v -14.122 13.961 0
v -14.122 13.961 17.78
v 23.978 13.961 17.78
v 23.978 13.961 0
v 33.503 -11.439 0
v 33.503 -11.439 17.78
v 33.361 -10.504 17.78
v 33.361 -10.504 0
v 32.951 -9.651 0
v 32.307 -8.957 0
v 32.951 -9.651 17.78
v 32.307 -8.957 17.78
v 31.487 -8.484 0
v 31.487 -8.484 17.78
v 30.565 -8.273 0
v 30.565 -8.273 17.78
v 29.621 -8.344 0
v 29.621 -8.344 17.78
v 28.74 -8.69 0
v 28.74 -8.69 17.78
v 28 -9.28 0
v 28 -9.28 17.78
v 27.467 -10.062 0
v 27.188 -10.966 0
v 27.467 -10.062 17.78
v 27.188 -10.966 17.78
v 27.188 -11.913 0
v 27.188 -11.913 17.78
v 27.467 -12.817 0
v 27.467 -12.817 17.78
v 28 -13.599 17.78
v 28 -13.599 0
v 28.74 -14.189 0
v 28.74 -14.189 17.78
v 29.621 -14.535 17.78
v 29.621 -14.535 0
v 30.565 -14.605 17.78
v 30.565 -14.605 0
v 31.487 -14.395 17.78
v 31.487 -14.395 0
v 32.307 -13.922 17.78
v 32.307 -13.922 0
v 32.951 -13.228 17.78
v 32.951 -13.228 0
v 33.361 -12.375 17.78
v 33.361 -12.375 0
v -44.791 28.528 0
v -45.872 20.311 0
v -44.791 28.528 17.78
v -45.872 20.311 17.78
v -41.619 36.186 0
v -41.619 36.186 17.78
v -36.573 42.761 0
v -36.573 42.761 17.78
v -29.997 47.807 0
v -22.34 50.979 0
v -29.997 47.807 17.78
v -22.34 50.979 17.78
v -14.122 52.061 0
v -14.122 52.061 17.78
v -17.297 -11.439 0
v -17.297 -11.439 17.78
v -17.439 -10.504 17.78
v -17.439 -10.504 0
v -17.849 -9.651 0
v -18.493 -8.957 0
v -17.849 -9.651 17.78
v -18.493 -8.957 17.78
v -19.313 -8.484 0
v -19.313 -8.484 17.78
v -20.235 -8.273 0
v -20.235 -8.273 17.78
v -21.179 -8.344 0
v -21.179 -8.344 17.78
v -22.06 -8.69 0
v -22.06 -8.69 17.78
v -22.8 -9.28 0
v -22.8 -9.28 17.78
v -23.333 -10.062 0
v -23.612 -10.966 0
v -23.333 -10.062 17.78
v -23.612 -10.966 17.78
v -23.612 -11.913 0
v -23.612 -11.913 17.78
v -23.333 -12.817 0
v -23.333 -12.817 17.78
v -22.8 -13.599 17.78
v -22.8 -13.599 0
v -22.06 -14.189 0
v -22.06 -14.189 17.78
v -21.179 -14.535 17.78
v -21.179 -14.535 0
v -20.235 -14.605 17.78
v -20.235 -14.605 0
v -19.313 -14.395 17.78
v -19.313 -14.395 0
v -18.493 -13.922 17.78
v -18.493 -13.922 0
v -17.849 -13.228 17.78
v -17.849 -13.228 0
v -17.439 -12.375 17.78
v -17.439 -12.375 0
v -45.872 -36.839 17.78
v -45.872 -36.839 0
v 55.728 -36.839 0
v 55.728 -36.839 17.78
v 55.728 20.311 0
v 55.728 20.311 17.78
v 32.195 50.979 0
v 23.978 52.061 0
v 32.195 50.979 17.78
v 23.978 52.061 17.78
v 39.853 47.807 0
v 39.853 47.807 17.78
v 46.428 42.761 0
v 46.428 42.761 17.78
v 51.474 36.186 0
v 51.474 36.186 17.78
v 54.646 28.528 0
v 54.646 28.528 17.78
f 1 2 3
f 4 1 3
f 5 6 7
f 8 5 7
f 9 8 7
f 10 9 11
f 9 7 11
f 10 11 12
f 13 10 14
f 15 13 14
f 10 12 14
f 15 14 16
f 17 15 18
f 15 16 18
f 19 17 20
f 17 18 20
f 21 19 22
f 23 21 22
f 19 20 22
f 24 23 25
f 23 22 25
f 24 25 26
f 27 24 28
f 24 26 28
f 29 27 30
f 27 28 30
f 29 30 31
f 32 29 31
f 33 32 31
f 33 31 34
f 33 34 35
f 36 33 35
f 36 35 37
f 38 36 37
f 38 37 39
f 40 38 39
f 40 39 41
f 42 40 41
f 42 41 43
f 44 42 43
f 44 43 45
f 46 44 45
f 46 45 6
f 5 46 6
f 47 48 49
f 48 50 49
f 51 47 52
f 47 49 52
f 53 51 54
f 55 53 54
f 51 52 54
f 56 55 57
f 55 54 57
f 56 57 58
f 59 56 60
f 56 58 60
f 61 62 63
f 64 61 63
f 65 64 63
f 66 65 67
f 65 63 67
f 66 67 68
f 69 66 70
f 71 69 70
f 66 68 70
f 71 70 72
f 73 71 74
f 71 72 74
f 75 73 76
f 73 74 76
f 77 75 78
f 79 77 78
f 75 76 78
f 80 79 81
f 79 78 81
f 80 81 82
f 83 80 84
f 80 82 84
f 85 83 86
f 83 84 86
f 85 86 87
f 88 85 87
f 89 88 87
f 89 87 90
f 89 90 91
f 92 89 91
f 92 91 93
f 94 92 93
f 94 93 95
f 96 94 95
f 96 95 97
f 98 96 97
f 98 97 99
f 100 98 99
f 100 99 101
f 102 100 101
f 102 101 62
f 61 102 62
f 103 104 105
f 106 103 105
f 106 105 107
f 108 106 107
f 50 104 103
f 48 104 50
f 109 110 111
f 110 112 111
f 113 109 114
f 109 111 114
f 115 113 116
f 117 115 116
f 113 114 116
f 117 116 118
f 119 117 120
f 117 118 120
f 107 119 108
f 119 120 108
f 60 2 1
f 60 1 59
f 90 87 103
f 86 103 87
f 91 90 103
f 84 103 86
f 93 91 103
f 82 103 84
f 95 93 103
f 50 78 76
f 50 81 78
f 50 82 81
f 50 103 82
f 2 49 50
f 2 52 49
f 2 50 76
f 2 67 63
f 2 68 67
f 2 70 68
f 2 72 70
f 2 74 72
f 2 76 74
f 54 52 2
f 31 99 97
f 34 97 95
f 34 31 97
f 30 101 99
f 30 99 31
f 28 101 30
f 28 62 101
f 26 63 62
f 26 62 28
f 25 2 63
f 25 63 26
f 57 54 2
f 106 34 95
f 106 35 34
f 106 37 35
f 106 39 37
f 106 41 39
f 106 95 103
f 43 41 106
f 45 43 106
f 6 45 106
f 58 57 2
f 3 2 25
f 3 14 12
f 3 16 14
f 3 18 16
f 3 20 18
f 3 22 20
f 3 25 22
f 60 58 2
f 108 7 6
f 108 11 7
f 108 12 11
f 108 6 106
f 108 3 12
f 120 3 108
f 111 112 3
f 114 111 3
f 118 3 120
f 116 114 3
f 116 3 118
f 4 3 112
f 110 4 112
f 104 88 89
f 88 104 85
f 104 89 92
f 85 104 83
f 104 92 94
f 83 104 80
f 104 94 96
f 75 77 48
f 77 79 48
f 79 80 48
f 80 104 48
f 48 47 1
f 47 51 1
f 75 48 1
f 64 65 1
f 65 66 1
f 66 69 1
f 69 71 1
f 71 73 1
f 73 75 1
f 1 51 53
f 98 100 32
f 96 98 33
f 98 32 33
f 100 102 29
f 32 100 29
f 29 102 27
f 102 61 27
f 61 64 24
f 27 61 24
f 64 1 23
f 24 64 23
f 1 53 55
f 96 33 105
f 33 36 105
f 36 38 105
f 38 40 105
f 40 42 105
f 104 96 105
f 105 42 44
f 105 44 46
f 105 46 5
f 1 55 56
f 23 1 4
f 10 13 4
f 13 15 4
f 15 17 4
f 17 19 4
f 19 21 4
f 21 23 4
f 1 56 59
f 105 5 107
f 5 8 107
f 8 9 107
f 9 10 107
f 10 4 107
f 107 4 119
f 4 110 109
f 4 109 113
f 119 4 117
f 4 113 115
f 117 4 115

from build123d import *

# Parameters (mm, degrees)
SKETCH1_W           = 101.6
SKETCH1_H           = 88.9
BOSS_EXTRUDE1_DEPTH = 17.78
SKETCH2_R           = 3.175
CUT_EXTRUDE1_DEPTH  = 18.78
FILLET1_R           = 31.75
SKETCH3_W           = 38.1
SKETCH3_H           = 38.1
CUT_EXTRUDE2_DEPTH  = 18.78


with BuildPart() as part:
    # Sketch1 → Boss-Extrude1 (new body)
    with BuildSketch(Plane.XY):
        with Locations((4.927530561, 7.6106367)):
            Rectangle(SKETCH1_W, SKETCH1_H)
    extrude(amount=BOSS_EXTRUDE1_DEPTH)

    # Sketch2 → Cut-Extrude1 (cut, through all)
    with BuildSketch(Plane.XY.offset(17.78)):
        with Locations((-20.472469439, -11.4393633)):
            Circle(SKETCH2_R)
        with Locations((30.327530561, -11.4393633)):
            Circle(SKETCH2_R)
    extrude(amount=-CUT_EXTRUDE1_DEPTH, mode=Mode.SUBTRACT)

    # Fillet1
    fillet1_edges = [part.edges().sort_by_distance(p)[0] for p in [
        (-45.872469439, 52.0606367, 8.89),
        (55.727530561, 52.0606367, 8.89),
    ]]
    fillet(fillet1_edges, radius=FILLET1_R)

    # Sketch3 → Cut-Extrude2 (cut, through all)
    with BuildSketch(Plane.XY.offset(17.78)):
        with Locations((4.927530561, 33.0106367)):
            Rectangle(SKETCH3_W, SKETCH3_H)
    extrude(amount=-CUT_EXTRUDE2_DEPTH, mode=Mode.SUBTRACT)


solid = part.part
